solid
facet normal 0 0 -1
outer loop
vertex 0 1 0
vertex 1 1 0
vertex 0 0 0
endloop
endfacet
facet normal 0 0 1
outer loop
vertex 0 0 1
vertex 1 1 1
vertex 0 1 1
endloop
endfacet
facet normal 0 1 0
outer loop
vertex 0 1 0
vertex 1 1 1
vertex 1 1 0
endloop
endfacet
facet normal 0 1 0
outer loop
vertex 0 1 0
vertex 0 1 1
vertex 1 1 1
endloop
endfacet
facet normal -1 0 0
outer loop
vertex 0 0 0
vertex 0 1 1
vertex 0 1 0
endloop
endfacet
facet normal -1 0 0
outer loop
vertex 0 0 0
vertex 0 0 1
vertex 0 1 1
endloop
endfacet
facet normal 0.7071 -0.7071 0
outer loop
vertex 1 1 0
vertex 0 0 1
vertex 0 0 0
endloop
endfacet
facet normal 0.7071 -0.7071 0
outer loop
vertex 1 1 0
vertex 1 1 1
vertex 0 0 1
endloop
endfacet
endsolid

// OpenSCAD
linear_extrude(height = 1){
    polygon( points=[[0,0],[0,1],[1,1]]);
}
